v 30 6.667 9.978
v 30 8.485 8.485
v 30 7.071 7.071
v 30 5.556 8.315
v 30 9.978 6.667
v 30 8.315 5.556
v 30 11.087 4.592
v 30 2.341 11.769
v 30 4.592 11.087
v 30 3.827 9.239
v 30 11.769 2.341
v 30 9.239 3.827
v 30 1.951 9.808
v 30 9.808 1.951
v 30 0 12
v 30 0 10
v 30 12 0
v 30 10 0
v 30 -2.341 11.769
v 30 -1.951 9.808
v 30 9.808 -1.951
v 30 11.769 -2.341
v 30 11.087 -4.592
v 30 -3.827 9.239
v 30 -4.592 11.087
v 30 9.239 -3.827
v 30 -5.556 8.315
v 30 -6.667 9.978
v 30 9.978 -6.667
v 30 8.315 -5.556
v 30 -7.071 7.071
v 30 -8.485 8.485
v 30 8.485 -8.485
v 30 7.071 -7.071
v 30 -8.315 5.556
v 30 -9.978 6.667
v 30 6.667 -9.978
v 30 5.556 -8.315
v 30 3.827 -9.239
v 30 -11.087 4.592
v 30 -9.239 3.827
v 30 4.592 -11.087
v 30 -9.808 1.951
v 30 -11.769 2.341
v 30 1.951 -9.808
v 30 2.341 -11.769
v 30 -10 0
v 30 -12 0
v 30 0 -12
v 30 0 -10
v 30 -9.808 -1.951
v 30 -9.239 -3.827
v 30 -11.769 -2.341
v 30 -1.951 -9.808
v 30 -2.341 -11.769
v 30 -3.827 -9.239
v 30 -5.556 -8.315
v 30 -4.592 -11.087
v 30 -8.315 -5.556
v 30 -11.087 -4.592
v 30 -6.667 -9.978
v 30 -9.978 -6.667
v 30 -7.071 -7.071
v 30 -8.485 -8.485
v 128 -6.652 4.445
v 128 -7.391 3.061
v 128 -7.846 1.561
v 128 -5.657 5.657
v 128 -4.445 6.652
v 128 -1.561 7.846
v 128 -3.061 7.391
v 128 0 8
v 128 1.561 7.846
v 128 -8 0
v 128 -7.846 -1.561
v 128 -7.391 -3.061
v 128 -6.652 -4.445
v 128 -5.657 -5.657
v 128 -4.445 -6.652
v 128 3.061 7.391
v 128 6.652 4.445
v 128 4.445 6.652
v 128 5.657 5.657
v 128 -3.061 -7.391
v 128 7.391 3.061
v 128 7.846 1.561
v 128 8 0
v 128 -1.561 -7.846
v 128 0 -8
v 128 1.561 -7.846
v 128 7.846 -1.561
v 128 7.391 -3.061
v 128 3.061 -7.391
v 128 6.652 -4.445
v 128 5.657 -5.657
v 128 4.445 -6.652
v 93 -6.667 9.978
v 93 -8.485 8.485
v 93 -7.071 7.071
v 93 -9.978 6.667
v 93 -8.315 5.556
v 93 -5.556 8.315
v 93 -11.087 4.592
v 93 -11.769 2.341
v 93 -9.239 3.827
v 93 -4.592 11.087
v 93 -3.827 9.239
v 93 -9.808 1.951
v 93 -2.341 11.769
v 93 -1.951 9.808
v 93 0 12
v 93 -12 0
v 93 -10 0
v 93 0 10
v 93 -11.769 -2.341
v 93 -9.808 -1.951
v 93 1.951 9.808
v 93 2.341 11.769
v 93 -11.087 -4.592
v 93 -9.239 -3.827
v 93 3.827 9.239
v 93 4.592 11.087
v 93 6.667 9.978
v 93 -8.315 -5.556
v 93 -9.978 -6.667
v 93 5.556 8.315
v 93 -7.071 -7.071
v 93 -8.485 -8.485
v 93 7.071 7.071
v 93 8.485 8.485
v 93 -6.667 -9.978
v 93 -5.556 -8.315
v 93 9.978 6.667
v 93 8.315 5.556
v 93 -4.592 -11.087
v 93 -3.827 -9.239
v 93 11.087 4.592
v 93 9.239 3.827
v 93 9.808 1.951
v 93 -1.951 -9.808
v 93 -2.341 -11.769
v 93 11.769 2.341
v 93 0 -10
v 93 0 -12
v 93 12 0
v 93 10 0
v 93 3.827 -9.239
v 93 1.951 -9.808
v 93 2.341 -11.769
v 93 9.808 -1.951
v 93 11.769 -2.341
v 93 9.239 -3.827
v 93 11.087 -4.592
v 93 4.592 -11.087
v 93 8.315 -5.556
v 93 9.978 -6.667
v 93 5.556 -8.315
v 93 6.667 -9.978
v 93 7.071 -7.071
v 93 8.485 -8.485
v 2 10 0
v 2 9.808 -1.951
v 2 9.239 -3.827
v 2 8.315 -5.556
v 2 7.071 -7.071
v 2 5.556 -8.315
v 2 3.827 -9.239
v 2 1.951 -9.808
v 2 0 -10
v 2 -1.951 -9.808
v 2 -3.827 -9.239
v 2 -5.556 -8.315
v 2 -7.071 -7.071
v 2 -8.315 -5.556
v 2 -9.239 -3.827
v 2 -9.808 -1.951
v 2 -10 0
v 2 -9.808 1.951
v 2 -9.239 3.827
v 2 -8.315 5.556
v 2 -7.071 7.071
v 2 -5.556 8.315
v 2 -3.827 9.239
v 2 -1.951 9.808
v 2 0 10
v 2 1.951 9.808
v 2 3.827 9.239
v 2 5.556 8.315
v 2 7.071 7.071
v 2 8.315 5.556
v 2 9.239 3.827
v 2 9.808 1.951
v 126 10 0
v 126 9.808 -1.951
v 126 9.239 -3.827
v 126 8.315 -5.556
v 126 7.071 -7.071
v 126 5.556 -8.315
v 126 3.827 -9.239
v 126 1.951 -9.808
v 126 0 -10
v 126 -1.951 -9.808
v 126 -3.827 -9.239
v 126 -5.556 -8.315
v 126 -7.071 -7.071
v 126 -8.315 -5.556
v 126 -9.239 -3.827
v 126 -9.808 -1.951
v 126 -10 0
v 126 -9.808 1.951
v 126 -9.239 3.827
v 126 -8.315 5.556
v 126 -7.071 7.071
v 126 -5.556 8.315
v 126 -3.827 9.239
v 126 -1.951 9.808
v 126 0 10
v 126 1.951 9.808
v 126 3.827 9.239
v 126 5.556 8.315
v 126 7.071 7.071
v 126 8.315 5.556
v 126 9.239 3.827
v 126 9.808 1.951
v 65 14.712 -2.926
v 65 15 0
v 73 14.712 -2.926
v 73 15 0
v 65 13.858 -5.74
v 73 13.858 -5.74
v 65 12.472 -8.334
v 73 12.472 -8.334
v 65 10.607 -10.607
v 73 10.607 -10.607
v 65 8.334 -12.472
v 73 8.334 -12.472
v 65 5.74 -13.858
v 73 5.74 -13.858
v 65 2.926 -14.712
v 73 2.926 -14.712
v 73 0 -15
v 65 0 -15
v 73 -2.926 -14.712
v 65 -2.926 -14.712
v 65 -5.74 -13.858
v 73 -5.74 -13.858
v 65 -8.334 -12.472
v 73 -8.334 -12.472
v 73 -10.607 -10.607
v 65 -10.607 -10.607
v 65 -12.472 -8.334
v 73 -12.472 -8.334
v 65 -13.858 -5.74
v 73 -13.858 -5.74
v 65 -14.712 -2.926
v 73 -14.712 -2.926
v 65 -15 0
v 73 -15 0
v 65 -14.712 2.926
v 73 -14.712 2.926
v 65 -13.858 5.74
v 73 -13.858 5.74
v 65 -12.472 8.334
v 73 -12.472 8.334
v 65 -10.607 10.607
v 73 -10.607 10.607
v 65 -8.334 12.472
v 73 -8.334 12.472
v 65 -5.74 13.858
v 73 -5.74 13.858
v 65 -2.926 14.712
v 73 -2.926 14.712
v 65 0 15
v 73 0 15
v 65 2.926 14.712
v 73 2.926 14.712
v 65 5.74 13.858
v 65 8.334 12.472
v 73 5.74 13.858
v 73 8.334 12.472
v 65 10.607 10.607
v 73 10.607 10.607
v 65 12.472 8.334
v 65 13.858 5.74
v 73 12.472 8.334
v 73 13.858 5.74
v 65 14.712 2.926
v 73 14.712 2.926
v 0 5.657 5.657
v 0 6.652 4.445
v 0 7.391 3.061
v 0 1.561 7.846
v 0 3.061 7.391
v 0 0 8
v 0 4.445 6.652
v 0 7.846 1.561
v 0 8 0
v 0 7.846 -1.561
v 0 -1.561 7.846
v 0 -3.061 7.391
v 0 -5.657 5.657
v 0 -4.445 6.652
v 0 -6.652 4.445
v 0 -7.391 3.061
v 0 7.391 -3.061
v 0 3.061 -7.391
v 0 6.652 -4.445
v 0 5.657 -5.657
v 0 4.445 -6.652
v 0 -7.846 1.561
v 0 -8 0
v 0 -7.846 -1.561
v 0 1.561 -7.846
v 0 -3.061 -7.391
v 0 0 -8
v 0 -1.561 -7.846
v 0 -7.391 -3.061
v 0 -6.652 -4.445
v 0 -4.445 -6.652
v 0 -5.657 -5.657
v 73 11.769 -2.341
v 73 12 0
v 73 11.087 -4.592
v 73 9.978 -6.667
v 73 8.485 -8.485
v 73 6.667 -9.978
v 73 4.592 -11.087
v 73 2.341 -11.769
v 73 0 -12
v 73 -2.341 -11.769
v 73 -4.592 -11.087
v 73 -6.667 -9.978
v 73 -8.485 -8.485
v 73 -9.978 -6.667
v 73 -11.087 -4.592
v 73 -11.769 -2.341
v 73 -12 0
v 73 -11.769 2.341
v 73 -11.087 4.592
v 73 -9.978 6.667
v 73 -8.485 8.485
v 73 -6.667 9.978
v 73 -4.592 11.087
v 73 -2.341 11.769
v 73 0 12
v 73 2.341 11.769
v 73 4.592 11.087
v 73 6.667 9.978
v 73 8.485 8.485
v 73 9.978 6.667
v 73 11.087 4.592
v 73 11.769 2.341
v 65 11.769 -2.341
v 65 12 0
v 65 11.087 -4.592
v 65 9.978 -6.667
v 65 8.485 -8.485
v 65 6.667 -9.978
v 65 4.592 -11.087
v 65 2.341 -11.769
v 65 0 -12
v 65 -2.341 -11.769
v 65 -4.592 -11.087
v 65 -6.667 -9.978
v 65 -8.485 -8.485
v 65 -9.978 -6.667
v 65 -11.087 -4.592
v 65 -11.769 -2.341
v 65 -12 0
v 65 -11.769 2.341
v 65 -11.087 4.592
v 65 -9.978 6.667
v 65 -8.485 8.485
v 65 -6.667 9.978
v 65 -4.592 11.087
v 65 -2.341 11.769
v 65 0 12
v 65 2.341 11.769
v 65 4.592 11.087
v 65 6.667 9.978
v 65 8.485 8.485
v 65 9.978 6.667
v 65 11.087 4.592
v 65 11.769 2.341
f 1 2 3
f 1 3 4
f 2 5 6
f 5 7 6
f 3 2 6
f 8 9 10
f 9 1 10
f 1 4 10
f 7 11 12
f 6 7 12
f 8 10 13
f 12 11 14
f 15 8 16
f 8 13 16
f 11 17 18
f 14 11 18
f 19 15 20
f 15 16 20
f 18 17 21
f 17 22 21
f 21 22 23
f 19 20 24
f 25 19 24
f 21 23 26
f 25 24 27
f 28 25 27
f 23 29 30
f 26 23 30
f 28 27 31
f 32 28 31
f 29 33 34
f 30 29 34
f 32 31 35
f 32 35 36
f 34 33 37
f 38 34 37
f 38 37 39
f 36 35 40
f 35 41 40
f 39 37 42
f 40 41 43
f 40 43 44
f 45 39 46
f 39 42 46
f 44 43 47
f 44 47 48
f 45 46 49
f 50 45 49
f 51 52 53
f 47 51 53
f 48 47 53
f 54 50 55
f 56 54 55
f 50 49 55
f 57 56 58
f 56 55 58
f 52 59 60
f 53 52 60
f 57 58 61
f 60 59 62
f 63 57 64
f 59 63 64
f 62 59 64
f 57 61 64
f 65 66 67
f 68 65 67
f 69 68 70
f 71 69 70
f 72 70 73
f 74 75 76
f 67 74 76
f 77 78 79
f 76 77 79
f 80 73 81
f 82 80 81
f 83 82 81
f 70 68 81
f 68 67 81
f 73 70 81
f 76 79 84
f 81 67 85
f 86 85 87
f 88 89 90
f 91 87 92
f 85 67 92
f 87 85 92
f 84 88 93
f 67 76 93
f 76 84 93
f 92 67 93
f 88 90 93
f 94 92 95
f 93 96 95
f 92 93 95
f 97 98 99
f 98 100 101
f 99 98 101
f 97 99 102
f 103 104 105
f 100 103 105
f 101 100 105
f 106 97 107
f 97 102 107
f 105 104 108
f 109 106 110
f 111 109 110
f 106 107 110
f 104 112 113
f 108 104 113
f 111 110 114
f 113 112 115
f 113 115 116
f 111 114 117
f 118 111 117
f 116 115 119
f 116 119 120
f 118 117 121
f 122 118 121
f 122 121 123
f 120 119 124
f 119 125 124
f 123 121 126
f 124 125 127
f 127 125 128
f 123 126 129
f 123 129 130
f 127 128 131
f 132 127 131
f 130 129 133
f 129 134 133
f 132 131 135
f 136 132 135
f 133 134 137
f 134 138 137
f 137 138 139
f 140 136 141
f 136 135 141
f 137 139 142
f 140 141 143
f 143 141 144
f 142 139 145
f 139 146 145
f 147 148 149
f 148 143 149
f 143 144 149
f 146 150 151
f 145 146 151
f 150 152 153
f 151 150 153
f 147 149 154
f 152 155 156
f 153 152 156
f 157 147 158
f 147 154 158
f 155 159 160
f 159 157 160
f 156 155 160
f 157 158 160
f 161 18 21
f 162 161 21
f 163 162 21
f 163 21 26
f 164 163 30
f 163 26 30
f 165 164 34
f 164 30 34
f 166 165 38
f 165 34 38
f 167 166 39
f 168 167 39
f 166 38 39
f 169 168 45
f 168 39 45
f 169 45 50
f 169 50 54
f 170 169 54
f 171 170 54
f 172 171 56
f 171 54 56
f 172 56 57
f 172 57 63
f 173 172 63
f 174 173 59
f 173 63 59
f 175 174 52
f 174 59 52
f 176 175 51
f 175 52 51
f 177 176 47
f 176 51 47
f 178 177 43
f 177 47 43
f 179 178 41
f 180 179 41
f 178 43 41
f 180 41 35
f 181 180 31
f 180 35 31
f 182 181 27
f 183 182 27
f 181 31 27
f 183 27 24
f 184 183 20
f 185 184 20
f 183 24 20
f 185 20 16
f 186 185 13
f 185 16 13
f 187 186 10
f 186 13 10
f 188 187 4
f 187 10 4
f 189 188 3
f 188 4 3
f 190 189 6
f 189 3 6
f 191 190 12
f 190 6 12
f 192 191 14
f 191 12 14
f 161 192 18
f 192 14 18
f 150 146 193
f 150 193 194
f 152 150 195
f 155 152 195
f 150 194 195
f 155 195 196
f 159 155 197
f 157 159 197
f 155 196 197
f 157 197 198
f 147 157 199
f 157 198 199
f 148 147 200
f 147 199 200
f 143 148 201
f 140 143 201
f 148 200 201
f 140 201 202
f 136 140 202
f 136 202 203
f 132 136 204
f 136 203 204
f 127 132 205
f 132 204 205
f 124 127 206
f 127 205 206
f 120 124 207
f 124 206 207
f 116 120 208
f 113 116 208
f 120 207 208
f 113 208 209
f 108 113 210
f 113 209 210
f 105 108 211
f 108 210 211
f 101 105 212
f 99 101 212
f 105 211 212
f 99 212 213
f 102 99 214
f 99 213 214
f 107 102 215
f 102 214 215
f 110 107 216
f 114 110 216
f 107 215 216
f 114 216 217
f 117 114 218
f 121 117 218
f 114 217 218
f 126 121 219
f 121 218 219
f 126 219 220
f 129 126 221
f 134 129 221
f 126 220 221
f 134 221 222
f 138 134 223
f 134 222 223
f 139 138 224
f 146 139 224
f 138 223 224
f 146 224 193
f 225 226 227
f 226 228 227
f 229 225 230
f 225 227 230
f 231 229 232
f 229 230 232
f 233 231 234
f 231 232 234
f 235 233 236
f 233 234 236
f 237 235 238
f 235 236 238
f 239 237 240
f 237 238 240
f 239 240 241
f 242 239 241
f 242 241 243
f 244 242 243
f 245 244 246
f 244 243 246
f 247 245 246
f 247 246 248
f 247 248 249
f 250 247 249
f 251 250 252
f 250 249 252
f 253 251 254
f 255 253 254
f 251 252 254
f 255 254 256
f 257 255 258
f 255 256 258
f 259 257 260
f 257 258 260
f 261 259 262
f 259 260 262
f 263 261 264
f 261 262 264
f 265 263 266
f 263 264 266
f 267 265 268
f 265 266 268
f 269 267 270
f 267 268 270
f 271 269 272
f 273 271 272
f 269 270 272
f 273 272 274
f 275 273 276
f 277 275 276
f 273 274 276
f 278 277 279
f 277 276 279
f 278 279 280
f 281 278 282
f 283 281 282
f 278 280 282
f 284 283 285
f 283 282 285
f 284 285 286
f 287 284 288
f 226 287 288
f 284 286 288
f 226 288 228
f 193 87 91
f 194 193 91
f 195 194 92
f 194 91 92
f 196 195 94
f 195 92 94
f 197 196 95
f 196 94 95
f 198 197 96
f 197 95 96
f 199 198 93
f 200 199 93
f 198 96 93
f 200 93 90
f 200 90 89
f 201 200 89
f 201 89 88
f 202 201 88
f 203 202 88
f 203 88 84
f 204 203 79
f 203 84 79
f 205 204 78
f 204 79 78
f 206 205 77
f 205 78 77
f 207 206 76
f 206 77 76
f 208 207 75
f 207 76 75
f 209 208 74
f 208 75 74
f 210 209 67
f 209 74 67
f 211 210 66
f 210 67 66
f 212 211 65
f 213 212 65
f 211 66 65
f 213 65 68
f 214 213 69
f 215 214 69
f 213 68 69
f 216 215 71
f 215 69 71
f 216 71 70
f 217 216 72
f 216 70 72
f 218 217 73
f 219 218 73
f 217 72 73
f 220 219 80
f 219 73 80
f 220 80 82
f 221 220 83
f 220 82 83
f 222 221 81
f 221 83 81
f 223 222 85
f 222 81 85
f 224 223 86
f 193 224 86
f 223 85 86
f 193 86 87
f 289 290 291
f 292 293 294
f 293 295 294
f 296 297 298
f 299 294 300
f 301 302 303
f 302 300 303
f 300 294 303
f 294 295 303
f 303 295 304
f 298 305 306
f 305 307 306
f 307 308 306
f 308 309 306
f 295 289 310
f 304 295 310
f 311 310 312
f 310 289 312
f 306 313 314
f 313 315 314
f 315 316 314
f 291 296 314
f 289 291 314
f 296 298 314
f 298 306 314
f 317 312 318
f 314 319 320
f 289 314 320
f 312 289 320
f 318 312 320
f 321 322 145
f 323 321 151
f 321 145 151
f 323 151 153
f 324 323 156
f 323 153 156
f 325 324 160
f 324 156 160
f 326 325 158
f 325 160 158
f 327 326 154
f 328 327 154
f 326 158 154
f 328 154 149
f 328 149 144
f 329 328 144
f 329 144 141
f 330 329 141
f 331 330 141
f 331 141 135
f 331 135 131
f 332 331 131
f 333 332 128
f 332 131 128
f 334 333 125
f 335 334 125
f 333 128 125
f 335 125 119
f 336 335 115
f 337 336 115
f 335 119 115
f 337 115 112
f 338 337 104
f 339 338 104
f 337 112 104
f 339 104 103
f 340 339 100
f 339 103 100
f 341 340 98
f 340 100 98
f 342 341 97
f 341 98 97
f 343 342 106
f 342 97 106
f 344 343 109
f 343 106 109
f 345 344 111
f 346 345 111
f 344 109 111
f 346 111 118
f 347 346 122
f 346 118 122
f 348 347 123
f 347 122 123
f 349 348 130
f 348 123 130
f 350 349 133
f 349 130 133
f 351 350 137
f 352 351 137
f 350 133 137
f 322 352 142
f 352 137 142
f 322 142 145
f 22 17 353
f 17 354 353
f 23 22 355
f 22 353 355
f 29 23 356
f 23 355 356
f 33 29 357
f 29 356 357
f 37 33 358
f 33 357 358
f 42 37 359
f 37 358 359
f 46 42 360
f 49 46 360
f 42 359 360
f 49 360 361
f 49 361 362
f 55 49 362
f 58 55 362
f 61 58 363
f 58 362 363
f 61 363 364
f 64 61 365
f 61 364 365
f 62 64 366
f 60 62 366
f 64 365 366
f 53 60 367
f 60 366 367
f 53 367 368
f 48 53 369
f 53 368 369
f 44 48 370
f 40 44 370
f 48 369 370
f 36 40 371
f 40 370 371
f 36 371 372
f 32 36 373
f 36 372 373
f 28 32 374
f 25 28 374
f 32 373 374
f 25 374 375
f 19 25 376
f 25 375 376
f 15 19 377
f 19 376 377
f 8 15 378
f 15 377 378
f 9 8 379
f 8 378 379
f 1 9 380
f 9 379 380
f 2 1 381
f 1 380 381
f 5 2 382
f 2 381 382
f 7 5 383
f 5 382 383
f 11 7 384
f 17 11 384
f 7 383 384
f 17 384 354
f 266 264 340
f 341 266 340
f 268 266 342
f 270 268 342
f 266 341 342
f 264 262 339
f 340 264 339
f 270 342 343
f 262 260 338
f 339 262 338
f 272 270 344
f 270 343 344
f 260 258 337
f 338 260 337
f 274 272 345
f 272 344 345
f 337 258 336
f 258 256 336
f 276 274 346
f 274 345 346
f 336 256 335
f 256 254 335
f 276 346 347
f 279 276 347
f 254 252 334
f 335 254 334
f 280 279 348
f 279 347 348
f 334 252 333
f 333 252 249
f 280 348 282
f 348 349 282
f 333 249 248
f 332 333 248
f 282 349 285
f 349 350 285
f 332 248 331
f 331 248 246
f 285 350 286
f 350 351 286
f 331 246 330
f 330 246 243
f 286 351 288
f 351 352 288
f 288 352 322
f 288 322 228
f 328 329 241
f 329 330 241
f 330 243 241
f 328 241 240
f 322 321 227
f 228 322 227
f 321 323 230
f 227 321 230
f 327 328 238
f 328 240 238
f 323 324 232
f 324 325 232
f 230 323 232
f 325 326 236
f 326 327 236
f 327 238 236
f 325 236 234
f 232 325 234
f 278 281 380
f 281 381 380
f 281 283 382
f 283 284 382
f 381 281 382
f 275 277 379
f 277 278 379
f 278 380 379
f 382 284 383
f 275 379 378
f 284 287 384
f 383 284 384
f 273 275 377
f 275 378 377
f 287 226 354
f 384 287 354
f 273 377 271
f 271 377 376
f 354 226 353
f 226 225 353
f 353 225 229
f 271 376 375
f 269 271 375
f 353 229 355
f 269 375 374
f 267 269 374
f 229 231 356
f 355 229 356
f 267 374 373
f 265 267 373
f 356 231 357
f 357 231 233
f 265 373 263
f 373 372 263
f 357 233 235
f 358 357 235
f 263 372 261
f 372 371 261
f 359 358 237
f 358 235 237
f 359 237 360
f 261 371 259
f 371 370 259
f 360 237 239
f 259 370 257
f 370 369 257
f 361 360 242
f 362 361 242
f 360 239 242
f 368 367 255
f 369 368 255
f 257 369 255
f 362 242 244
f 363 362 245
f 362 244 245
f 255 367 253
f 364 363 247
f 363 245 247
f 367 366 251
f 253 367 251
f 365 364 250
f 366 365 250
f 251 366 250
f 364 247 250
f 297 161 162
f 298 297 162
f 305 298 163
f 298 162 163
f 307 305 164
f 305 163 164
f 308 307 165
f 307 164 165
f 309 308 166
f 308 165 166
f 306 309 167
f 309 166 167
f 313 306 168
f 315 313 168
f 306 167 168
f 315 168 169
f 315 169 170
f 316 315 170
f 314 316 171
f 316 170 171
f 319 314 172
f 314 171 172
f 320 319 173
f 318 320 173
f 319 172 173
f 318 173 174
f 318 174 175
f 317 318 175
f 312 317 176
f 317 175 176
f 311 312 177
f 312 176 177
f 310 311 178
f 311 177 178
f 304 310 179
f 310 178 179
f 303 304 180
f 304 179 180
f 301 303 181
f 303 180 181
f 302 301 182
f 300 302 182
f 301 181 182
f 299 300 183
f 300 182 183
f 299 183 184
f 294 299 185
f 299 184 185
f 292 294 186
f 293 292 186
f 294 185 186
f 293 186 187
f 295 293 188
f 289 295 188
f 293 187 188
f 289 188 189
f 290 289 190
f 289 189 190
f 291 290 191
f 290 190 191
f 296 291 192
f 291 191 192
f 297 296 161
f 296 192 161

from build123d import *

# Parameters (mm, degrees)
ZKOSEN_1_SIZE = 2


with BuildPart() as part:
    # Skica1 → Rotovat1 (revolve)
    with BuildSketch(Plane.XY):
        Polygon((0, 0), (0, 10), (30, 10), (30, 12), (65, 12), (65, 15), (73, 15), (73, 12), (93, 12), (93, 10), (128, 10), (128, 0), align=None)
    revolve(axis=Axis((128, 0, 0), (-1, 0, 0)))

    # Zkosení1
    zkosen_1_edges = [part.edges().sort_by_distance(p)[0] for p in [
        (0, -10, 0),
        (128, -10, 0),
    ]]
    chamfer(zkosen_1_edges, length=ZKOSEN_1_SIZE)


solid = part.part
